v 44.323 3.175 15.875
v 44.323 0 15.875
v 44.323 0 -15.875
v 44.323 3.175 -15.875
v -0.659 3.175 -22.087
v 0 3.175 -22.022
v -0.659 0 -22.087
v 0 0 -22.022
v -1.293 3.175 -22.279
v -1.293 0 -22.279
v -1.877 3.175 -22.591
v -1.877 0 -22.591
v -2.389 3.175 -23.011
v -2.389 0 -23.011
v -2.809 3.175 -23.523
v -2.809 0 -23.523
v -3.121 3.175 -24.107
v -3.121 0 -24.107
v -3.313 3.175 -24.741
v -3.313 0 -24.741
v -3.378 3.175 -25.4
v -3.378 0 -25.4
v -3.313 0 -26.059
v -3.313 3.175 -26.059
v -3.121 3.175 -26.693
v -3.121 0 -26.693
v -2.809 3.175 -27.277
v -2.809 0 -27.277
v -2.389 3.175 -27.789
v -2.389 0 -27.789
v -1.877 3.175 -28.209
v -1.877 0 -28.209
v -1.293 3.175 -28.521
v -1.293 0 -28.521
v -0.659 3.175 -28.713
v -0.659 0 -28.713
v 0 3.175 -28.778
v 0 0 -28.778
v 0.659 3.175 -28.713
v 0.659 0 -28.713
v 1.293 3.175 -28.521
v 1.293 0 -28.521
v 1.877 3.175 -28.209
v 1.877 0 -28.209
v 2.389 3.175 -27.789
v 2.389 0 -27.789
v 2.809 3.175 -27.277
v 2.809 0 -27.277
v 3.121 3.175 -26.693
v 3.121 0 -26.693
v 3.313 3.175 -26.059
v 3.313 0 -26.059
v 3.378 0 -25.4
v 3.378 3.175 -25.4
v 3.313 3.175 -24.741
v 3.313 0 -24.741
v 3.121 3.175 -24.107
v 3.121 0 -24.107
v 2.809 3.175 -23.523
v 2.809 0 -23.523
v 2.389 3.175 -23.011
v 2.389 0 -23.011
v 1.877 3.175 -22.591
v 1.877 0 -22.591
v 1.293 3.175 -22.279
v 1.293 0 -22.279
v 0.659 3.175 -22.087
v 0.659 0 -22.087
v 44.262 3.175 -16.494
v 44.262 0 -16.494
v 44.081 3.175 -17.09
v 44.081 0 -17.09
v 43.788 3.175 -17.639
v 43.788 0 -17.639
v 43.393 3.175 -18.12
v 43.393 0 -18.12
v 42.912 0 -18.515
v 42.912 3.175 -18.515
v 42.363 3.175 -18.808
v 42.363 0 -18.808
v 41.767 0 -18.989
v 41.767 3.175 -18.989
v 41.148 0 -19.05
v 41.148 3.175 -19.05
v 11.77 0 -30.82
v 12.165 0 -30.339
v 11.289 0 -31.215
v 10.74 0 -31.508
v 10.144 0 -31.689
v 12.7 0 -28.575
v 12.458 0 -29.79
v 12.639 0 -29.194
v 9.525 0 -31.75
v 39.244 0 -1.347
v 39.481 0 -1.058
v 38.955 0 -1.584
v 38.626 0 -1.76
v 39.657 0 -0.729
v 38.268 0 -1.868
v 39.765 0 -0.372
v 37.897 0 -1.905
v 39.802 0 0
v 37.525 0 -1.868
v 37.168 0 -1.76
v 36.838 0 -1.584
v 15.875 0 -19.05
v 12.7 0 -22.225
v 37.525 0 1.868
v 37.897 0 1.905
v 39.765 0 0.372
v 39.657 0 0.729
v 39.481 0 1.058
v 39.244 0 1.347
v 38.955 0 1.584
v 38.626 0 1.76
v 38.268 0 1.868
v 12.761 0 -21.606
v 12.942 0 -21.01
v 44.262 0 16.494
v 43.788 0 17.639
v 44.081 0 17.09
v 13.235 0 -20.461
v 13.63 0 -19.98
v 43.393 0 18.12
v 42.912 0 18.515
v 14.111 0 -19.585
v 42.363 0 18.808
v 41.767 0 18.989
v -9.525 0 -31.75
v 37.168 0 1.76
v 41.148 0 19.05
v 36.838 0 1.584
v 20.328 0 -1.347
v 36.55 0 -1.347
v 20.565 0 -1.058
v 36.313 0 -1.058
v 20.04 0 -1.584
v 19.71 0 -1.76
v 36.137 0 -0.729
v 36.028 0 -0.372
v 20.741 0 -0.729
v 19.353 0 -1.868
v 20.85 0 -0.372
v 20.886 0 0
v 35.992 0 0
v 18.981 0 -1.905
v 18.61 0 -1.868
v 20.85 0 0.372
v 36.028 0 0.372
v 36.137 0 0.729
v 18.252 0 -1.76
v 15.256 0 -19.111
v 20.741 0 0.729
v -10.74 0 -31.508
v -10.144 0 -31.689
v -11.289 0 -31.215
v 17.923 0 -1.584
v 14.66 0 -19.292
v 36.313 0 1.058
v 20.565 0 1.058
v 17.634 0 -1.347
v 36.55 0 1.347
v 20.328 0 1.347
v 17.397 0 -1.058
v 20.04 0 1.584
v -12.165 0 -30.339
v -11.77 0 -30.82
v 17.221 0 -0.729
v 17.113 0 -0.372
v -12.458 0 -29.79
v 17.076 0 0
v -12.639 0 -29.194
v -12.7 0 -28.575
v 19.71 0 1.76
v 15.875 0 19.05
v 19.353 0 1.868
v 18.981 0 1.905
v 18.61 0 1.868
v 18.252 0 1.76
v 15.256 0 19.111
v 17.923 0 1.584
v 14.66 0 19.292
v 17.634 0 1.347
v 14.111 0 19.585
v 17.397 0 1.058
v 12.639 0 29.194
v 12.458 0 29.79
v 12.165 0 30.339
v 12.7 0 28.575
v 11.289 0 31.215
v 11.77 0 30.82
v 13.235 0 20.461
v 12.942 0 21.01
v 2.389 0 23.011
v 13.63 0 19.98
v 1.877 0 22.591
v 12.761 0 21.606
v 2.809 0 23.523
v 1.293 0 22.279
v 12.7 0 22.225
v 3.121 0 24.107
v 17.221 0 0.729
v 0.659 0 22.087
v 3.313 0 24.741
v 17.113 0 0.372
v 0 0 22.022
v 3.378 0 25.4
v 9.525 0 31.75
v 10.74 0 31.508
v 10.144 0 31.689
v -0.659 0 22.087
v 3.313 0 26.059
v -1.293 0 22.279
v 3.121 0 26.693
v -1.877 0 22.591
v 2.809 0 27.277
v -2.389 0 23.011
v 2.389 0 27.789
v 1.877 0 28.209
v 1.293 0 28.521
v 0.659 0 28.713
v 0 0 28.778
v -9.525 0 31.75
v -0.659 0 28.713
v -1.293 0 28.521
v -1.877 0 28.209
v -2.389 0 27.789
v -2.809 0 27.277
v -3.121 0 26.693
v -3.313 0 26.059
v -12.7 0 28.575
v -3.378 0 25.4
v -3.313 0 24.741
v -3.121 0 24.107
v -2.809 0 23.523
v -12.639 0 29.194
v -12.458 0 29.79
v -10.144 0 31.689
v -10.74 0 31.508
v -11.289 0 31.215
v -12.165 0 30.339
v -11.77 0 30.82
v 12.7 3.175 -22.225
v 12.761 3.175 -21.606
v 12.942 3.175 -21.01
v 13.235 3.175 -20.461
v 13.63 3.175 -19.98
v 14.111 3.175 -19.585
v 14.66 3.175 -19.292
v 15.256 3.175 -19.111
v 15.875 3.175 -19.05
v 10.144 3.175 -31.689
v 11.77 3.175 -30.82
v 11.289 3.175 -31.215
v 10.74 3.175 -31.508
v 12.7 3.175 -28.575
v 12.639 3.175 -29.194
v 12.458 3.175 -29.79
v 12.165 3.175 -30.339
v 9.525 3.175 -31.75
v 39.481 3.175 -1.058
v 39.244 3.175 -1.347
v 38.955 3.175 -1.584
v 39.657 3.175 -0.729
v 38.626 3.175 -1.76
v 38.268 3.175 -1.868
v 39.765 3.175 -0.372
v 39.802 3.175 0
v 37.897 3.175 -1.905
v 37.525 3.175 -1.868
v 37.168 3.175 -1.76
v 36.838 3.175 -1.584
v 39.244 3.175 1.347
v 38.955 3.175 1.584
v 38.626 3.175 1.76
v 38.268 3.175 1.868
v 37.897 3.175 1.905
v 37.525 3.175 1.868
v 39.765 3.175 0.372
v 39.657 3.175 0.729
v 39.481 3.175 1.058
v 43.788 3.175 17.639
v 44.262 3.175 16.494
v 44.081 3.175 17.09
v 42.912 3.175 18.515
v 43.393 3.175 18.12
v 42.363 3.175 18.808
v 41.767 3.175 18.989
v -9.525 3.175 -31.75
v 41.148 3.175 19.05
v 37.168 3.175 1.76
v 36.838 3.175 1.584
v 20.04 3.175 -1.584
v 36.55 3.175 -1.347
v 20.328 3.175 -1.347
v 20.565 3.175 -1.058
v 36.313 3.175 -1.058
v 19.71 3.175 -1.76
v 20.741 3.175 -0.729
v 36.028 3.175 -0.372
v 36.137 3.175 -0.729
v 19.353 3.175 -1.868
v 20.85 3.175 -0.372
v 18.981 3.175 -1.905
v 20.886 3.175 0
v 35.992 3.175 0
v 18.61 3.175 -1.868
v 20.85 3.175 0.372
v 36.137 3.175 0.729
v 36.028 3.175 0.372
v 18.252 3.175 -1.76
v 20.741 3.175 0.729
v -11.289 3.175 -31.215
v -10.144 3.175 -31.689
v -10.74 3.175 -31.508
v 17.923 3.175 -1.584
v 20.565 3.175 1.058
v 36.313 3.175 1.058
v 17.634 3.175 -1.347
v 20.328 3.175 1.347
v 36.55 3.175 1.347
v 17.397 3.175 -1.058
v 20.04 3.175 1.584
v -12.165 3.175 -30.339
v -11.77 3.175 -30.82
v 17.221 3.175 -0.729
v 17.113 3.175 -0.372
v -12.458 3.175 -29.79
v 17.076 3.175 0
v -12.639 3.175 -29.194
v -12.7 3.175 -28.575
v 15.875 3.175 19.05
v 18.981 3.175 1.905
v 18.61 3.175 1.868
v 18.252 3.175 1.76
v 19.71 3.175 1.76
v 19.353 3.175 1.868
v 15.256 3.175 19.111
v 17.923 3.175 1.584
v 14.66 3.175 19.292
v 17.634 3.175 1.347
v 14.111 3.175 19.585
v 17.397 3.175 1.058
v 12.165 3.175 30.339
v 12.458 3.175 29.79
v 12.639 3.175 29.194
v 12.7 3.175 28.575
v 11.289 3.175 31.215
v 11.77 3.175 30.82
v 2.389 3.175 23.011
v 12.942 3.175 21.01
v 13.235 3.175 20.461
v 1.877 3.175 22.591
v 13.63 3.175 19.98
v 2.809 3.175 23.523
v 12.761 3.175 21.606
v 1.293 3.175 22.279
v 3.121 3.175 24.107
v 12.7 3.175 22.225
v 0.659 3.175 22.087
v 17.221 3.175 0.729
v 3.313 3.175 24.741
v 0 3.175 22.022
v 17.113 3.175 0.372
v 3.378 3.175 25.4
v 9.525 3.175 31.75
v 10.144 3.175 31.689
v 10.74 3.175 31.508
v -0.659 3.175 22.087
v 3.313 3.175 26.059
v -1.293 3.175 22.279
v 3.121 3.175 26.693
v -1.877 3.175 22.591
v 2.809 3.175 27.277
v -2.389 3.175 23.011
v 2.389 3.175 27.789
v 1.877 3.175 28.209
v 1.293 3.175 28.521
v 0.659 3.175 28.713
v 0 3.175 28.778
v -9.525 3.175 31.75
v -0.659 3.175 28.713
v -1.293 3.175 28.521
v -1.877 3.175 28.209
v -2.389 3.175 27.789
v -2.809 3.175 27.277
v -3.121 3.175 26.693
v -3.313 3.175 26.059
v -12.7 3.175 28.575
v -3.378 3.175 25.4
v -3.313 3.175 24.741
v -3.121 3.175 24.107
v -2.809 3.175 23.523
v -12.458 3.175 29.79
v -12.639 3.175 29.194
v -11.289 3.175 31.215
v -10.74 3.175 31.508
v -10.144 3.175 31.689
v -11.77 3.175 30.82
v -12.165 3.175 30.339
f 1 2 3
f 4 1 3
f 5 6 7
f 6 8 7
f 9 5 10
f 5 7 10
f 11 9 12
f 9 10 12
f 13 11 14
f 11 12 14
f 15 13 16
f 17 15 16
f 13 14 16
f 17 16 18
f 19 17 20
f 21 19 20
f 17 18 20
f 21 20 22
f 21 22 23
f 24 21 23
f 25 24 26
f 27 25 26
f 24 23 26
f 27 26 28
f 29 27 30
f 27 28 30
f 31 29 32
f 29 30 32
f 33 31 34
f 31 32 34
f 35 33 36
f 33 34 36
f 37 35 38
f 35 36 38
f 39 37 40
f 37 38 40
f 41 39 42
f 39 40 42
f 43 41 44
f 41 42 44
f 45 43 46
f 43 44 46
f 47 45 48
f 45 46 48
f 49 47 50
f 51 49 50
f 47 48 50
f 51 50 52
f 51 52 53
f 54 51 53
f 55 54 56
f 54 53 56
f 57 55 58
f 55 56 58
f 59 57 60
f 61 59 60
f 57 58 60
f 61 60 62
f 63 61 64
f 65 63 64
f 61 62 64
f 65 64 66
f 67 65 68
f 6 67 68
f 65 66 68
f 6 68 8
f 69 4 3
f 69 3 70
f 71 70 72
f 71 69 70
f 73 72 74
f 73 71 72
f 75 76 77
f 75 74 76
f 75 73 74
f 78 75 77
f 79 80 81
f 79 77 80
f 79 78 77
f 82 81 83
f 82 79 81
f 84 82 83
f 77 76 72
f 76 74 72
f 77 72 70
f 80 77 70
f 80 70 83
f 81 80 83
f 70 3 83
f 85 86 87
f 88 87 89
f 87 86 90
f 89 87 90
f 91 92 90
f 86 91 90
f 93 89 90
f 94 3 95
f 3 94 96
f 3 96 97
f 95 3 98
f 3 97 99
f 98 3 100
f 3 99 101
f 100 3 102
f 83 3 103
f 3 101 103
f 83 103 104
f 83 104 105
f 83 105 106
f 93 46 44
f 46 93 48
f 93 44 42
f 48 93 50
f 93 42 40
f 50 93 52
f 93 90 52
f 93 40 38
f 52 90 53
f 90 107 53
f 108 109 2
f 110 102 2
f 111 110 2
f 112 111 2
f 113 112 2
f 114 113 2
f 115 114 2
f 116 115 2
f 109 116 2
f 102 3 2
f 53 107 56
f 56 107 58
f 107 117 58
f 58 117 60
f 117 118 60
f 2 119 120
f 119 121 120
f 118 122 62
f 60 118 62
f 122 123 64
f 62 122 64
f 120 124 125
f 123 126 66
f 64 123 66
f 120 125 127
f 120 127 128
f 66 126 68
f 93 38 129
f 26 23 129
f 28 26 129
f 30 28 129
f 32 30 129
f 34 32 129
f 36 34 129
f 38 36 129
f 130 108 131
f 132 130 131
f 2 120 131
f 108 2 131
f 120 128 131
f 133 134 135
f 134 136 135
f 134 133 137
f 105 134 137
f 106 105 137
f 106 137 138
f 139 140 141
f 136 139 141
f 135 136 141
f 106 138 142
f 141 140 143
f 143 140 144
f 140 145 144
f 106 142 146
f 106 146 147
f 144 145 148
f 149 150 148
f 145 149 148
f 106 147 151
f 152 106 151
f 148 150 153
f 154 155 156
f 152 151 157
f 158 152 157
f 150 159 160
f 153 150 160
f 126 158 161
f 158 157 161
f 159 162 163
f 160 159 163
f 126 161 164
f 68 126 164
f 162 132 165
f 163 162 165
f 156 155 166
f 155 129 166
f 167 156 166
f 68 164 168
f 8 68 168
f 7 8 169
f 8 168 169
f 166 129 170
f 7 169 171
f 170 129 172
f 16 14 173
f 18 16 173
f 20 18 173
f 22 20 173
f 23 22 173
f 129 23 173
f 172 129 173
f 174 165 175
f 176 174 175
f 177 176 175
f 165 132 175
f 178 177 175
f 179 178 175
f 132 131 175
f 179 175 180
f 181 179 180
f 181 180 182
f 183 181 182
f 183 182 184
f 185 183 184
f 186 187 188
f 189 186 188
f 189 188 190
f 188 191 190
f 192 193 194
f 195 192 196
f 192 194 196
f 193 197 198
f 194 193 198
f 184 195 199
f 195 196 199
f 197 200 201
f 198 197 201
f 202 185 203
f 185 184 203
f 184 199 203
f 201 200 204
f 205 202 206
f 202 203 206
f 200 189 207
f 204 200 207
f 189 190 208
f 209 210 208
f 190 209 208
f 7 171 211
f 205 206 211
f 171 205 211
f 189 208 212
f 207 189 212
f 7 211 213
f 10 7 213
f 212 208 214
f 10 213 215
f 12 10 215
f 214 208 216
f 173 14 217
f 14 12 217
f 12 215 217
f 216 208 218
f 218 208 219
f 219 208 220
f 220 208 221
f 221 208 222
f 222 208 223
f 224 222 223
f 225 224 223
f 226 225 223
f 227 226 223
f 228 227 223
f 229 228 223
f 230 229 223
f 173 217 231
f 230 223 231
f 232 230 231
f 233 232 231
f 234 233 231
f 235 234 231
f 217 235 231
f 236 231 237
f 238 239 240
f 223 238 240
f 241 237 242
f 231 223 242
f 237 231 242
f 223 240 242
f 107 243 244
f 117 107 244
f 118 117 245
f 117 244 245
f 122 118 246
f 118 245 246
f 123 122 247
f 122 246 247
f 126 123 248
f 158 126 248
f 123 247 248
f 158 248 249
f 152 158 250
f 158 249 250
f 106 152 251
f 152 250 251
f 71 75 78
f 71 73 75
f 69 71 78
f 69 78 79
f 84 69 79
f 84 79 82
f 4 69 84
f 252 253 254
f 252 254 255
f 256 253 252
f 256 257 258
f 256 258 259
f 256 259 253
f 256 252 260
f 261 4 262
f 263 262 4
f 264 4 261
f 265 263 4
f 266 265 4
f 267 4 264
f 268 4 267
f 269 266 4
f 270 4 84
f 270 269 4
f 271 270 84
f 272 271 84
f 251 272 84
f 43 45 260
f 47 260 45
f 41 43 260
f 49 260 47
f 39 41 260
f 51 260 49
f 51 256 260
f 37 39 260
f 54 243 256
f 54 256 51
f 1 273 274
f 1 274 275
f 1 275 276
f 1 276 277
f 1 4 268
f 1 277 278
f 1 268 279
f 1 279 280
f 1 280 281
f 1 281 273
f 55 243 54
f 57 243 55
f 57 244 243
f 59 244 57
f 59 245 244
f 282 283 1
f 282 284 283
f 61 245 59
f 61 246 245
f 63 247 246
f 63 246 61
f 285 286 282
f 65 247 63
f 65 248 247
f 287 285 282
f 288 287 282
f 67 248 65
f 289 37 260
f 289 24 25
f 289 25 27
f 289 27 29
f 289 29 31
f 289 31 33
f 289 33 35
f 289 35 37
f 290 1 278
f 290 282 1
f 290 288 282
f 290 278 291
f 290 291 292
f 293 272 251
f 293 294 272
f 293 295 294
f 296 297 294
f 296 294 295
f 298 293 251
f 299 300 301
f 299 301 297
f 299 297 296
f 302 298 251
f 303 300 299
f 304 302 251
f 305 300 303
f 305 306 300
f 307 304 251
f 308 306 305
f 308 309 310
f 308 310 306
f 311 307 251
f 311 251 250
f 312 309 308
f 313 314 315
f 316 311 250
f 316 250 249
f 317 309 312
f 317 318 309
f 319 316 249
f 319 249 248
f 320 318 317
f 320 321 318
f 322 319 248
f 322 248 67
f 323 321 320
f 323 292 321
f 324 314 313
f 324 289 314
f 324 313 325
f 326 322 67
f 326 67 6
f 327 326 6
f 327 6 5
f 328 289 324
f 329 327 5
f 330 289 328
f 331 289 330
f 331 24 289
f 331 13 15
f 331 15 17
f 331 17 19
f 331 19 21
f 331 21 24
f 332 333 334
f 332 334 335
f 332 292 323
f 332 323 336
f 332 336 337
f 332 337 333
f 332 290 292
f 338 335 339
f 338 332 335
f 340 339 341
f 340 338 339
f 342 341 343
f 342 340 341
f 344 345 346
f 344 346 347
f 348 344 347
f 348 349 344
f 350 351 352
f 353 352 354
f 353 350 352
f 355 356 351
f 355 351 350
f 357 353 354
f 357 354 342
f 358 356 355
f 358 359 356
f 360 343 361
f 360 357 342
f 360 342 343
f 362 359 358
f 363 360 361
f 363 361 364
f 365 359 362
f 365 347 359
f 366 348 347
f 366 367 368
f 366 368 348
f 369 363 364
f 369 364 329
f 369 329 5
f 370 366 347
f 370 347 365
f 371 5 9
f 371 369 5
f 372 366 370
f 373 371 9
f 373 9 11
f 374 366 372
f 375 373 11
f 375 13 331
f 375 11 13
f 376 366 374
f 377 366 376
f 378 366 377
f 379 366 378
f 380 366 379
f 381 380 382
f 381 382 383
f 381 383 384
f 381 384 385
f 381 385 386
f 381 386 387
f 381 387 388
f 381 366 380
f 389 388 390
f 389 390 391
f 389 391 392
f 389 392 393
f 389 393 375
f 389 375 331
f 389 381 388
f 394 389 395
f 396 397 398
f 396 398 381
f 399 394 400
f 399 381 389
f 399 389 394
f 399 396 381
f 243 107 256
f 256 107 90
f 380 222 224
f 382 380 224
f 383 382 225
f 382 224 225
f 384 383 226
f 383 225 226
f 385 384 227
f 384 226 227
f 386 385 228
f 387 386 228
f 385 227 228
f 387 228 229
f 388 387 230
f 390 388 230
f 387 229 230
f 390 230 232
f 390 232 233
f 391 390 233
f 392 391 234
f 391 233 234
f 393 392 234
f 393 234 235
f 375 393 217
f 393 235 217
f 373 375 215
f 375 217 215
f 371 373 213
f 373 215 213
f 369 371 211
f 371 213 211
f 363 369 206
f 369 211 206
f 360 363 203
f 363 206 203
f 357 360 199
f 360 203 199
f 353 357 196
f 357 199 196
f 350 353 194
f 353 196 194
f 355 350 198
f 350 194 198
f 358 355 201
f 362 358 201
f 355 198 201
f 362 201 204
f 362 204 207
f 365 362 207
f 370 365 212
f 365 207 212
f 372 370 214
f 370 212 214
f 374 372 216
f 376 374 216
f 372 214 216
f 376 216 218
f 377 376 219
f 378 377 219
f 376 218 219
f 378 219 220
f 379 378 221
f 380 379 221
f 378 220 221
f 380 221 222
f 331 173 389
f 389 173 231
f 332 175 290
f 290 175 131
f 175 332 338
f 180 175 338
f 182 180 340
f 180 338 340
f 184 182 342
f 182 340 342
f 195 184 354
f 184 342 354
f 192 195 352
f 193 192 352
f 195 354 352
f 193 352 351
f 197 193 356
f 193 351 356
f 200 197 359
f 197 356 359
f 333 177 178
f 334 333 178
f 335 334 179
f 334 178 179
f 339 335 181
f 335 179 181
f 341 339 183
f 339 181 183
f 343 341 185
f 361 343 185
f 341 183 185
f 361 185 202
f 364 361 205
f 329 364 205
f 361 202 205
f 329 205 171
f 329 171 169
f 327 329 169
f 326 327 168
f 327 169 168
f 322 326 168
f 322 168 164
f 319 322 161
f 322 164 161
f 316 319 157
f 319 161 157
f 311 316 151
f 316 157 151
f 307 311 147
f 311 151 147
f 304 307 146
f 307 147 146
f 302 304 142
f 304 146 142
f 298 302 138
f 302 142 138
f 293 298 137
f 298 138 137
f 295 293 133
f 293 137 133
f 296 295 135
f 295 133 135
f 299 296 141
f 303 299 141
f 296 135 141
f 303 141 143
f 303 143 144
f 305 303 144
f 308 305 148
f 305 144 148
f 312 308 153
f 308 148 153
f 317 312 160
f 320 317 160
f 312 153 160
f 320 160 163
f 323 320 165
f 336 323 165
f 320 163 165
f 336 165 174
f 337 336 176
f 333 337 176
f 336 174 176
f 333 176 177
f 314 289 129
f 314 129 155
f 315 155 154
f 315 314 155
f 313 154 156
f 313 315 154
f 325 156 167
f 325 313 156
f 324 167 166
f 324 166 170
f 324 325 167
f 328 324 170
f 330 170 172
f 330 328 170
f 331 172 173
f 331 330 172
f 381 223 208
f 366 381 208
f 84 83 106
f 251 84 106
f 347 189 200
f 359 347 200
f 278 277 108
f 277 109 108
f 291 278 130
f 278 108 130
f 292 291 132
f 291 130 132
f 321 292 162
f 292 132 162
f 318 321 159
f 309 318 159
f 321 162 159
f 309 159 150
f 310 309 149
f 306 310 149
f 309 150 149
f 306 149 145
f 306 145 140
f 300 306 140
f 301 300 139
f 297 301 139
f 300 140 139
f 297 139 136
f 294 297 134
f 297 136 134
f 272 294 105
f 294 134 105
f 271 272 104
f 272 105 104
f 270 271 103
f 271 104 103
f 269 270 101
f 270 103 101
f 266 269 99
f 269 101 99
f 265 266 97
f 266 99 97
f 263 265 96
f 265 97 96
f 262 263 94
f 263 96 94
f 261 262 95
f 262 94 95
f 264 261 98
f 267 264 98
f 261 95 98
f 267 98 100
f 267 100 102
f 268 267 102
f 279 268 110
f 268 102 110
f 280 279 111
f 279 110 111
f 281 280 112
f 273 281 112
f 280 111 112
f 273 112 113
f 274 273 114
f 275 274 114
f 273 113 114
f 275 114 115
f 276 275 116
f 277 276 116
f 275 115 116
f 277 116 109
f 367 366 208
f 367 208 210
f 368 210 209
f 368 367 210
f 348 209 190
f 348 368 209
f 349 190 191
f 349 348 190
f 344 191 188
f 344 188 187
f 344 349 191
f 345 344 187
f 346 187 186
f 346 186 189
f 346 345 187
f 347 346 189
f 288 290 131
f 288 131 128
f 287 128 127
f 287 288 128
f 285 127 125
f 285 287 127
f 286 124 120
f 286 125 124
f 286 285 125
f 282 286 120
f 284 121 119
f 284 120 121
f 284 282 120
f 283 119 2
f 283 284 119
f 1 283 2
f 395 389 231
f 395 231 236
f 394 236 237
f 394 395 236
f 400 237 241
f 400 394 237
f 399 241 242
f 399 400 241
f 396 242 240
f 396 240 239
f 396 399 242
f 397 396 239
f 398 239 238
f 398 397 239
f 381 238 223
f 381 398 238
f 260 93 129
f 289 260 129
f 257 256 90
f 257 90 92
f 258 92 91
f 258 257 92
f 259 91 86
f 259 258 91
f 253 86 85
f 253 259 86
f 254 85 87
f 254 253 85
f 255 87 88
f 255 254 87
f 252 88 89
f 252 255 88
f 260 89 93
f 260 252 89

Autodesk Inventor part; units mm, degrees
ref_plane "YZ Plane" through (0, 0, 0) normal (1, 0, 0) x (0, 1, 0)
ref_plane "XZ Plane" through (0, 0, 0) normal (0, 1, 0) x (-1, 0, 0)
ref_plane "XY Plane" through (0, 0, 0) normal (0, 0, 1) x (1, 0, 0)
sketch "Sketch1" plane through (0, 0, 0) normal (0, 1, 0) x (-1, 0, 0)
  line L0 (-12.7, -31.75) -> (12.7, -31.75)
  line L1 (12.7, -31.75) -> (12.7, 31.75)
  line L2 (12.7, 31.75) -> (-12.7, 31.75)
  line L3 (-12.7, 31.75) -> (-12.7, -31.75)
  line L4 (-12.7, -31.75) -> (12.7, 31.75) construction
  line L5 (12.7, -31.75) -> (-12.7, 31.75) construction
  line L6 (-12.7, 19.05) -> (-44.323, 19.05)
  line L7 (-44.323, 19.05) -> (-44.323, -19.05)
  line L8 (-44.323, -19.05) -> (-12.7, -19.05)
  point P0 (0, 0)
  dimension "d0" = 25.4
  dimension "d1" = 63.5
  dimension "d21" = 31.623
  dimension "d22" = 12.7
  dimension "d23" = 12.7
extrude "Extrusion1" add sketch "Sketch1" along normal blind 3.175
sketch "Sketch2" plane through (0, 3.175, 0) normal (0, 1, 0) x (1, 0, 0)
  line L0 (0, -25.4) -> (0, 25.4) construction
  line L1 (-12.7, 31.75) -> (-12.7, -31.75) construction
  point P0 (0, 0)
  point P1 (0, 0)
  dimension "d4" = 50.8
hole "Hole1" at (0, 3.175, 25.4) at (0, 3.175, -25.4) direction (0, -1, 0) diameter 6.7564 end through all clearance for "Flat Head Machine Screw (82)" size "1/4" standard "Ansi Unified Screw Threads"
sketch "Sketch3" plane through (0, 3.175, 0) normal (0, 1, 0) x (1, 0, 0)
  line L0 (44.323, -19.05) -> (44.323, 19.05) construction
  point P0 (0, 0)
  point P1 (18.9813, 0)
  point P2 (37.8968, 0)
  point P3 (0, 0)
  dimension "d13" = 18.9155
  dimension "d24" = 6.4262
hole "Hole2" at (18.9813, 3.175, 0) at (37.8968, 3.175, 0) direction (0, -1, 0) diameter 3.81 end through all clearance for "Flat Head Machine Screw (82)" size "#6" standard "Ansi Unified Screw Threads"
fillet "Fillet1" radius 3.175 8 edges at (12.7, 1.5875, 19.05) (12.7, 1.5875, 31.75) (-12.7, 1.5875, 31.75) (-12.7, 1.5875, -31.75) (12.7, 1.5875, -31.75) (12.7, 1.5875, -19.05) (44.323, 1.5875, -19.05) (44.323, 1.5875, 19.05)
properties part number "DB1-010" material "Polycarbonate, Smoke"
